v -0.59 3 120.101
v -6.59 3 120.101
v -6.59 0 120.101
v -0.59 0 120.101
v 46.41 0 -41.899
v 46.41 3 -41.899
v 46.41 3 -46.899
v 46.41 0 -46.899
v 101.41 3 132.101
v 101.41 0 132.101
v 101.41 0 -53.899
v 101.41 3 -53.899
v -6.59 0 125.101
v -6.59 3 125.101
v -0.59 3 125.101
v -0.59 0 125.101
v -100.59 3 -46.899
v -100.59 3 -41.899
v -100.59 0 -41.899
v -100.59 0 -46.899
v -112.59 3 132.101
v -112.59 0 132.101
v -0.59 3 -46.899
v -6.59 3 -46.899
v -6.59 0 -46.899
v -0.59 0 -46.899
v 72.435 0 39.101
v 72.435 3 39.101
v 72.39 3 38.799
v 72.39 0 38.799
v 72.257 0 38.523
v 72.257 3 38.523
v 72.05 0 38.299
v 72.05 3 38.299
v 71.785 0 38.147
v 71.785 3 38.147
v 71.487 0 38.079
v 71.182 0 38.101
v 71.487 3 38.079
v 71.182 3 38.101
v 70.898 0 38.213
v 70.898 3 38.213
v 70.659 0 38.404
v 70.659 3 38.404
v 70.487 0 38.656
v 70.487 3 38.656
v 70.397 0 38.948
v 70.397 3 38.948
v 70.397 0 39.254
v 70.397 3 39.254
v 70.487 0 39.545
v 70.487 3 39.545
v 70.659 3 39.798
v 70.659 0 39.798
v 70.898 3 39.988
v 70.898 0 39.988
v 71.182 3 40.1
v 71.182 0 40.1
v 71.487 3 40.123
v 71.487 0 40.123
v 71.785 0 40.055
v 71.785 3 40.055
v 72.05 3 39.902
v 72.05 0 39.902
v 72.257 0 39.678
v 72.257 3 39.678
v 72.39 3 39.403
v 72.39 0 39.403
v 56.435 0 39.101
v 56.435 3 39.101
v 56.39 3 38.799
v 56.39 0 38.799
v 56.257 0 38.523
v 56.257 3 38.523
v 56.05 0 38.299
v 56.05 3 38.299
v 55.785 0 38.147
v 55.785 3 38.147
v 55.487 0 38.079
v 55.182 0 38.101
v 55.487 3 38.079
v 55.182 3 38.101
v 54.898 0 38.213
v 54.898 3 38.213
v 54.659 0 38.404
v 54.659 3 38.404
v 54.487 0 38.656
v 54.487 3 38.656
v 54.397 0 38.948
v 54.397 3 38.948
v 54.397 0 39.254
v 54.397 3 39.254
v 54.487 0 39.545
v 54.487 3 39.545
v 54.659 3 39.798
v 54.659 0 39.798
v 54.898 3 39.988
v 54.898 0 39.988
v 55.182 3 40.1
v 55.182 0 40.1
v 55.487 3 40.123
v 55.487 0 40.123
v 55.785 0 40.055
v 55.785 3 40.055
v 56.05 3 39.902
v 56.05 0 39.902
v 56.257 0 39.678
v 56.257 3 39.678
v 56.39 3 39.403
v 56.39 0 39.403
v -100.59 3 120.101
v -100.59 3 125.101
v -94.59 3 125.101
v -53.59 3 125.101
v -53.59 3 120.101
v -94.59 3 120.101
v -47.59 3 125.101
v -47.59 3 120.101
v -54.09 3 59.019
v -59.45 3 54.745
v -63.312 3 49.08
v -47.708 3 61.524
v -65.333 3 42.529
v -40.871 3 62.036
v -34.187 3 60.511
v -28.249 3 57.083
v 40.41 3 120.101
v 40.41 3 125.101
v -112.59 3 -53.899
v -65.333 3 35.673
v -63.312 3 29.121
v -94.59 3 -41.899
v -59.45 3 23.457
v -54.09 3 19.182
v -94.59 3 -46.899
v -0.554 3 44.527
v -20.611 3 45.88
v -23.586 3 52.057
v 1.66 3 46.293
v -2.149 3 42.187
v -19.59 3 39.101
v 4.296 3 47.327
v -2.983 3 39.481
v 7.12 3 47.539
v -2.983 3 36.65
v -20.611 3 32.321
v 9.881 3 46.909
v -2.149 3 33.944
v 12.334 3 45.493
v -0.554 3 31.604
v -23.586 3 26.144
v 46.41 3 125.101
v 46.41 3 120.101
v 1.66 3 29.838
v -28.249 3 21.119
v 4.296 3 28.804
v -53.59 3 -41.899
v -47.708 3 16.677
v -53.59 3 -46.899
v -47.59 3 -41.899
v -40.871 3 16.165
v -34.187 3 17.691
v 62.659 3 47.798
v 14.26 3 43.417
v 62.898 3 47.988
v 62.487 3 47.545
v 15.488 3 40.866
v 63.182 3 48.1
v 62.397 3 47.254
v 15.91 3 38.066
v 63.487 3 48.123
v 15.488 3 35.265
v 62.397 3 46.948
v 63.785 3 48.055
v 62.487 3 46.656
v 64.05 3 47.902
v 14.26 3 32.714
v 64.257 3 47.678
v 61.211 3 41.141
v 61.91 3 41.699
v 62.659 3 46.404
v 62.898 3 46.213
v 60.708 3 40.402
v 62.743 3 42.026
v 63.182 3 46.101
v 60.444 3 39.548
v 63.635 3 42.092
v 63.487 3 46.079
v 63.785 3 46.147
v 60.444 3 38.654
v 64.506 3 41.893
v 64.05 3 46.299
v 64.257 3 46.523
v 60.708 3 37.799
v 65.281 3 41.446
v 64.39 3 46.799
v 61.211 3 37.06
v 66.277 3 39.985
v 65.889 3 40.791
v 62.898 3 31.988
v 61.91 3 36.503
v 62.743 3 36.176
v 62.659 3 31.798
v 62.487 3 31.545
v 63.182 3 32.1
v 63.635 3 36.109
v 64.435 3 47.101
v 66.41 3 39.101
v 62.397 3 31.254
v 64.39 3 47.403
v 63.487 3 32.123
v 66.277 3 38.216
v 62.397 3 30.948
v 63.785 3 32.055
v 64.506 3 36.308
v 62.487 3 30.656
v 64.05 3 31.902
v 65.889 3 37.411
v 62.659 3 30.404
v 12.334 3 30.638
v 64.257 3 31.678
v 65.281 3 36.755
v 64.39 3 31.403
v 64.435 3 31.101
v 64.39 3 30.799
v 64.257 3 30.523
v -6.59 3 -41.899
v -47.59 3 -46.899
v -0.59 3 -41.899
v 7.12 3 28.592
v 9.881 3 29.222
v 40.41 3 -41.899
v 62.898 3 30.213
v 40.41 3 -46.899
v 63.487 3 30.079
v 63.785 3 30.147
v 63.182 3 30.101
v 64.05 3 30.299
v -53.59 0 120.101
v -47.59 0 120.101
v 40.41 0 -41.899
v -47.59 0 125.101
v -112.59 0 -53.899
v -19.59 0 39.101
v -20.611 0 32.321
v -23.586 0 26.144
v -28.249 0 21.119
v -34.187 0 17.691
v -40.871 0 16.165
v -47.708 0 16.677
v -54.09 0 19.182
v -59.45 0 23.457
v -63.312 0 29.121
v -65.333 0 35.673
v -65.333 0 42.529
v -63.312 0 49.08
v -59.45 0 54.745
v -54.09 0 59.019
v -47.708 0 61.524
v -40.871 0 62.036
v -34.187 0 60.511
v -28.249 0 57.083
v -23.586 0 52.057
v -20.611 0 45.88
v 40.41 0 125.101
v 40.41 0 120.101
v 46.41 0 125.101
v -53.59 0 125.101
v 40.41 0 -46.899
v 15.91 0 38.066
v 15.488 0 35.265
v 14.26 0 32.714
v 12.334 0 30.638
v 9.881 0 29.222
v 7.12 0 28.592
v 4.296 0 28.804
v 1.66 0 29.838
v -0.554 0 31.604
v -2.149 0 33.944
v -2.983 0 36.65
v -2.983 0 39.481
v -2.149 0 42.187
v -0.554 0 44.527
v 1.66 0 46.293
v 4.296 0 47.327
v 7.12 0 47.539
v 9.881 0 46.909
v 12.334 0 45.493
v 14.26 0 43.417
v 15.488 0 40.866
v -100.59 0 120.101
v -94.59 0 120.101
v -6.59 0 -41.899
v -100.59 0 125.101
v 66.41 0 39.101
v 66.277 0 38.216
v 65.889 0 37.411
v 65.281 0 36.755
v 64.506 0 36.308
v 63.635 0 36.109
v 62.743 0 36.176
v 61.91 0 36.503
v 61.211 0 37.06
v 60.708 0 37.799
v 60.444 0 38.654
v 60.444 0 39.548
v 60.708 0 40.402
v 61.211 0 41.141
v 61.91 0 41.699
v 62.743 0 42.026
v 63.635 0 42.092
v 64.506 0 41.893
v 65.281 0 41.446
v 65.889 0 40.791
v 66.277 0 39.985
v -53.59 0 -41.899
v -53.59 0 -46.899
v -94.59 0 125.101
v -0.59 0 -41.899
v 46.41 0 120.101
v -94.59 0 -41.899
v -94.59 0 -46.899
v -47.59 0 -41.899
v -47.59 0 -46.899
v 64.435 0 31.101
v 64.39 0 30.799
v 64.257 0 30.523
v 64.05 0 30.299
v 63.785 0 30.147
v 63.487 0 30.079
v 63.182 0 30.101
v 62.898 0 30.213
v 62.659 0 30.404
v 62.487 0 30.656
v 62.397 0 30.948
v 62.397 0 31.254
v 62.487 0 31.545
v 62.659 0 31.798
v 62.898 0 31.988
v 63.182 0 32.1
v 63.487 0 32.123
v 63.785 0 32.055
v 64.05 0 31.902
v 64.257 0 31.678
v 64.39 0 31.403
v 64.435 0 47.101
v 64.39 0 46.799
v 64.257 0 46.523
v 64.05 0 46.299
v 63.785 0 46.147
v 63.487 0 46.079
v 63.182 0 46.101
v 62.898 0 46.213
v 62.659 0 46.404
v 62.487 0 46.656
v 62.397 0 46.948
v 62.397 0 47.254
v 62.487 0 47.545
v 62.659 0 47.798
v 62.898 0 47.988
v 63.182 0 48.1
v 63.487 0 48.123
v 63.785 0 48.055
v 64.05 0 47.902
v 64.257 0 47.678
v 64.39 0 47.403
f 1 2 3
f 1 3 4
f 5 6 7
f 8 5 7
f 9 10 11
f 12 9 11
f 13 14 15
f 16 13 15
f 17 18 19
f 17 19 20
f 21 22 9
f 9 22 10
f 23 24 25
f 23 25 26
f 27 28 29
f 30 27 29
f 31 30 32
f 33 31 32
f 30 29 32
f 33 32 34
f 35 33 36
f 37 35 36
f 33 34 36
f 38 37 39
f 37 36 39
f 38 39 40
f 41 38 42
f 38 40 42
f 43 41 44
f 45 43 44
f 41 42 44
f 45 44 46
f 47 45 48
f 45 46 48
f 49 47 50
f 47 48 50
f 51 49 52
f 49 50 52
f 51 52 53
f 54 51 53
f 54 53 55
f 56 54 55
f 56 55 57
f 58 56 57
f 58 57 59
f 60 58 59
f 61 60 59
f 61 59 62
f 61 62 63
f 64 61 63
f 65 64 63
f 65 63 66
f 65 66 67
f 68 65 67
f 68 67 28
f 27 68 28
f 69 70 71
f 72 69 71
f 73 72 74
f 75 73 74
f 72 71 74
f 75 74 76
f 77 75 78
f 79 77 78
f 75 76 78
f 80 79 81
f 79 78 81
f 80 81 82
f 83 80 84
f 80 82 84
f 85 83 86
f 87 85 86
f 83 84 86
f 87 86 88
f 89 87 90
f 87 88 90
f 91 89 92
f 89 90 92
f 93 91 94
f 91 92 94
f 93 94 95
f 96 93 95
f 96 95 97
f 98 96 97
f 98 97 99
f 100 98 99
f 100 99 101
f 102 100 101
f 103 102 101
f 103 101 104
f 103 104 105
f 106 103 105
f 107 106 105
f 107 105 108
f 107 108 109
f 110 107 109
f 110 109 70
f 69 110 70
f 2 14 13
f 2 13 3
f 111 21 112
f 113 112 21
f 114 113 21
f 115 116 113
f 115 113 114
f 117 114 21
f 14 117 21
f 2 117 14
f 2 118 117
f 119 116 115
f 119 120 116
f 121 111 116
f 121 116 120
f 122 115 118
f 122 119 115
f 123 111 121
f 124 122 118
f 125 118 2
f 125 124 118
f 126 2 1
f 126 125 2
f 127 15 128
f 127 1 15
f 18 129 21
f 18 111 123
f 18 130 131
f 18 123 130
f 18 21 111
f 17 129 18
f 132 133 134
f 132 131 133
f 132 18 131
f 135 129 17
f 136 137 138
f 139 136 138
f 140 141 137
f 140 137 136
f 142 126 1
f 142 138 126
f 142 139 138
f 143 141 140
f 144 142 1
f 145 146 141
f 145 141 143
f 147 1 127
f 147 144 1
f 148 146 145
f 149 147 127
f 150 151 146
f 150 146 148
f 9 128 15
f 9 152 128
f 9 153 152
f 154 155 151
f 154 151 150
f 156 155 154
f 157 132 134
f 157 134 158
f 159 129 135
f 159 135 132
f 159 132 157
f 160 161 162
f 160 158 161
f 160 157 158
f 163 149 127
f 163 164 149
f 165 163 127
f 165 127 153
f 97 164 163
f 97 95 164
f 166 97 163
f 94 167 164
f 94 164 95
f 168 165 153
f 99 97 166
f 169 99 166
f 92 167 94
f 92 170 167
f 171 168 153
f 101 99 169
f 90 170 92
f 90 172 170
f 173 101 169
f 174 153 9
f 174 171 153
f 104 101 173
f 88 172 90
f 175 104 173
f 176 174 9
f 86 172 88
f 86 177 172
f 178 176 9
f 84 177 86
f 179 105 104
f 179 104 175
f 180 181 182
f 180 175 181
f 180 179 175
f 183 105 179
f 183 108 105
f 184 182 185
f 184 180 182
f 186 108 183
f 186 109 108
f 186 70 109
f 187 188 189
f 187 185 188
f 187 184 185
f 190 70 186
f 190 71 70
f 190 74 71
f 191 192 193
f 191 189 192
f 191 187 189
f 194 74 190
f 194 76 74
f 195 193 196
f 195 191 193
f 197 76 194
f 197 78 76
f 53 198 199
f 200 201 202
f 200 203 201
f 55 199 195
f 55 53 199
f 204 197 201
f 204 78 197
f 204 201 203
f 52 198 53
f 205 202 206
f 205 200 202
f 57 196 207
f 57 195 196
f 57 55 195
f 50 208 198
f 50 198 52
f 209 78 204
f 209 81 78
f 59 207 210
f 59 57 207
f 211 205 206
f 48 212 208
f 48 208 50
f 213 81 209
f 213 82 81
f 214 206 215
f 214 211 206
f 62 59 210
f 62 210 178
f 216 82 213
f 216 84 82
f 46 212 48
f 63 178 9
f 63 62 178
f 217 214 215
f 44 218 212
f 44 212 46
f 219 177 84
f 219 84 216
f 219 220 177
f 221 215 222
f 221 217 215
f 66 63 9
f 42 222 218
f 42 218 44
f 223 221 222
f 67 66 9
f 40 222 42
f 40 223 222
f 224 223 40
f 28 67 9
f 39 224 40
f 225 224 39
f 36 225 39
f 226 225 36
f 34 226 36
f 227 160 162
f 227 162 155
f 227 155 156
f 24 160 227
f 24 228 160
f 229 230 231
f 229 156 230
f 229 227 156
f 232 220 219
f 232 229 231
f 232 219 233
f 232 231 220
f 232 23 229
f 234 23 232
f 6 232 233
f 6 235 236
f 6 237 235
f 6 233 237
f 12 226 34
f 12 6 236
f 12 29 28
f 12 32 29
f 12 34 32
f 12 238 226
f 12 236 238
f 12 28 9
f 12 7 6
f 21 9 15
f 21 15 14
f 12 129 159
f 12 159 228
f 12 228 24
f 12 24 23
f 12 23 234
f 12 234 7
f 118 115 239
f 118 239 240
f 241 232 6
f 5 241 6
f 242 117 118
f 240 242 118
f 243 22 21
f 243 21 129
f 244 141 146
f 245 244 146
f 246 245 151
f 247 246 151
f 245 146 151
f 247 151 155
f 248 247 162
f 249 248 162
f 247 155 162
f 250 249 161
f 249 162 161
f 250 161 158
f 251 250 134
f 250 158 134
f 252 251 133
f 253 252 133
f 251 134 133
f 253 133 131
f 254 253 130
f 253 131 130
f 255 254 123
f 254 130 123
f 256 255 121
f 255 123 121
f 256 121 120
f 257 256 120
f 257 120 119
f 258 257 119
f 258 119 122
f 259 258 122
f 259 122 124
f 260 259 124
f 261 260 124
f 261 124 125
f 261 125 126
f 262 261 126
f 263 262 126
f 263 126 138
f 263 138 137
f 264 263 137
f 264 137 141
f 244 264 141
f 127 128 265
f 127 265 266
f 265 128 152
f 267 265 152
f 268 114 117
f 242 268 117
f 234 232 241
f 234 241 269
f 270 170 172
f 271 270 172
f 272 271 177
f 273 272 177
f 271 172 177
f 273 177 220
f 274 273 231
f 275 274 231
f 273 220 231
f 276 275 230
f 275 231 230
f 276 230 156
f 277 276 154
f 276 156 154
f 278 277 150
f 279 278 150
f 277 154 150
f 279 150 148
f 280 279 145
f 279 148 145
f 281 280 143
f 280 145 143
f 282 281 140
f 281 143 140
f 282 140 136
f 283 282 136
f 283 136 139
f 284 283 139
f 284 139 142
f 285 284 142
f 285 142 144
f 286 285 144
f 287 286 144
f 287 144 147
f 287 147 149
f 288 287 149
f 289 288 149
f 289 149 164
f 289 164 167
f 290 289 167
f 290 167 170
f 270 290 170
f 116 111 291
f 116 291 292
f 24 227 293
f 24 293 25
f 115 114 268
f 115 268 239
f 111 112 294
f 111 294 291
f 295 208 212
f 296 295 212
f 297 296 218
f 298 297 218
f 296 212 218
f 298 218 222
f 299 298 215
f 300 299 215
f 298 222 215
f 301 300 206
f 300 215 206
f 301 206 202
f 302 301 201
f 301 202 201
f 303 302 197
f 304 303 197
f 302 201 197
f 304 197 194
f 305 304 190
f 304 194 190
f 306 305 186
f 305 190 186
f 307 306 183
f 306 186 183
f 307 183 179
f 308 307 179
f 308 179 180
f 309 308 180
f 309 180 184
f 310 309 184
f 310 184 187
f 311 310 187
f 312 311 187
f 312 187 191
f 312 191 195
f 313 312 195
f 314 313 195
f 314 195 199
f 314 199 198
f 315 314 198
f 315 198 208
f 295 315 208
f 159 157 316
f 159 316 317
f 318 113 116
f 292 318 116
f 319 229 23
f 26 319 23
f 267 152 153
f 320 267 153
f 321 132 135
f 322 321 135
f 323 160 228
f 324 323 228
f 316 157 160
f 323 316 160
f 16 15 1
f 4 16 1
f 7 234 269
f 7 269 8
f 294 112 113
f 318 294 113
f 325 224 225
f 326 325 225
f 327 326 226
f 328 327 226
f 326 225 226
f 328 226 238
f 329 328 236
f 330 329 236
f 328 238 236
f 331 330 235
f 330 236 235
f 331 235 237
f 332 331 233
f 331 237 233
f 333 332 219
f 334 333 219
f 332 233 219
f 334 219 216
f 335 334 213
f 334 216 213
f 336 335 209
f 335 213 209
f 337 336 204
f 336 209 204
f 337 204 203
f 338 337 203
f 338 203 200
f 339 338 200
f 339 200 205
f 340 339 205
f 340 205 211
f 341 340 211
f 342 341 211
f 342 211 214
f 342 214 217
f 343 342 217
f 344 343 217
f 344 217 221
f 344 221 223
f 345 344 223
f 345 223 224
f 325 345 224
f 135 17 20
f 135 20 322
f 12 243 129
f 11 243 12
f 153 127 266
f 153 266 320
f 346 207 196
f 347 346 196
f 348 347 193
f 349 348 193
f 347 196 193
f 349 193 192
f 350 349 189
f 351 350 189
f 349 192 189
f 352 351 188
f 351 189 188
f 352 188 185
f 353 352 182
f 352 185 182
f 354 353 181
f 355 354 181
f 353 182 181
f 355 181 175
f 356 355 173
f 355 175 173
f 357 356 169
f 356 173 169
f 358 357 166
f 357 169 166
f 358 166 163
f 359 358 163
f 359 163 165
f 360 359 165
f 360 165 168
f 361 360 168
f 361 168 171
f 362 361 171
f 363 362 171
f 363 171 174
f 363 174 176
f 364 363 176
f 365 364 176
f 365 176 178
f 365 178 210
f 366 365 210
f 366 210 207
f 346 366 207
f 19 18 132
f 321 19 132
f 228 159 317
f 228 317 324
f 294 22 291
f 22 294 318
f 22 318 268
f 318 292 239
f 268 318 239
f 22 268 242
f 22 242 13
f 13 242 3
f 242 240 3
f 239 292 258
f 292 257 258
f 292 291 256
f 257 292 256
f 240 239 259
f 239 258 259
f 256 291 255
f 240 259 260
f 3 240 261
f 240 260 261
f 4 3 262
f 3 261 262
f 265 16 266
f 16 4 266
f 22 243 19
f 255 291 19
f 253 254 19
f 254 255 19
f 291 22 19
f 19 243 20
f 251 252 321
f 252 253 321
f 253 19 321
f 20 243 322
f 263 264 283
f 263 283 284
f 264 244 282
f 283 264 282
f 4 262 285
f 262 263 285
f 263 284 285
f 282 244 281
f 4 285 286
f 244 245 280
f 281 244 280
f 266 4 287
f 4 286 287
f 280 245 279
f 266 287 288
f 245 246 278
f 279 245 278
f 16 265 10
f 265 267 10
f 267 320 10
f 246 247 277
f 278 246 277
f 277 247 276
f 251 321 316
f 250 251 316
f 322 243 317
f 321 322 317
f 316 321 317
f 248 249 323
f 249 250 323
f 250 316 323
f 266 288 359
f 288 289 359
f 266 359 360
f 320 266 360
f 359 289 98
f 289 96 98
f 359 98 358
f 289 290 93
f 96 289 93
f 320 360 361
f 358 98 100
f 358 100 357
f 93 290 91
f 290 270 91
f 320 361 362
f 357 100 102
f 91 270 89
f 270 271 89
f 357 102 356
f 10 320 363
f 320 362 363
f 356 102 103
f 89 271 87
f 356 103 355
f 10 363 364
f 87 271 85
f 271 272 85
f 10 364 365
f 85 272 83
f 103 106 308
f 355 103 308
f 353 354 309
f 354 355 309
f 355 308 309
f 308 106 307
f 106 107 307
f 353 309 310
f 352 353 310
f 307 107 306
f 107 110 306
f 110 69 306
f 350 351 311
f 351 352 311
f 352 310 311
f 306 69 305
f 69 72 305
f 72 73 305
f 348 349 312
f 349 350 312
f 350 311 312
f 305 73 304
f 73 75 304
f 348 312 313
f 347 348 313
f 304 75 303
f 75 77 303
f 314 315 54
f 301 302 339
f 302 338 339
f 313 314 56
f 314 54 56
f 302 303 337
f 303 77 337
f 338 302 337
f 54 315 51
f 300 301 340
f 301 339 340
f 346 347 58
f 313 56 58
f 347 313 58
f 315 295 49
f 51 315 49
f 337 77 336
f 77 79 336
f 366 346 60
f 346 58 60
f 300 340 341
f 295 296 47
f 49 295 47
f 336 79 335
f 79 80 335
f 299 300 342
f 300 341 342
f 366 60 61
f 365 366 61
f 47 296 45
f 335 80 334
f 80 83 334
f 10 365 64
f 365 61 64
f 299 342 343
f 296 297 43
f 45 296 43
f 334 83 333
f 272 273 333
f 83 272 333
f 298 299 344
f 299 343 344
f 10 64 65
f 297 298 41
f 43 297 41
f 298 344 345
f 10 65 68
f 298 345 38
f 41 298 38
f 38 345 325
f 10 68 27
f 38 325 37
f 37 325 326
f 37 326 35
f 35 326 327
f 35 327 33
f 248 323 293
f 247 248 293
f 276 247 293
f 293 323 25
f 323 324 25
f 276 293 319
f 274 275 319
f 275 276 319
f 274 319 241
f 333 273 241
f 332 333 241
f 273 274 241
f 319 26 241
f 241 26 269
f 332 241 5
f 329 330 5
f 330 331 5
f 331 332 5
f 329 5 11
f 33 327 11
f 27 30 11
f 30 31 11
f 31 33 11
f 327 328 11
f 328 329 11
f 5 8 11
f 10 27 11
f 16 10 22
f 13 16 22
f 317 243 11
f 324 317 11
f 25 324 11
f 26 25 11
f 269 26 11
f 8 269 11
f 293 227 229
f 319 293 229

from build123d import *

# Parameters (mm, degrees)
SKETCH1_W           = 214
SKETCH1_H           = 186
BOSS_EXTRUDE1_DEPTH = 3
SKETCH2_R           = 23
SPEAKER_DEPTH       = 4
SKETCH4_R           = 3
SKETCH4_R_2         = 1.025
MOTOR_DEPTH         = 4
SKETCH6_W           = 6
SKETCH6_H           = 5
IZGARALAR_DEPTH     = 4
SKETCH7_R           = 9.5
MOTOR_KABLOSU_DEPTH = 4


with BuildPart() as part:
    # Sketch1 → Boss-Extrude1 (new body)
    with BuildSketch(Plane(origin=(0, 0, 0), x_dir=(1, 0, 0), z_dir=(0, 1, 0))):
        with Locations((-5.589552239, -39.100746269)):
            Rectangle(SKETCH1_W, SKETCH1_H)
    extrude(amount=BOSS_EXTRUDE1_DEPTH)

    # Sketch2 → Speaker (cut, through all)
    with BuildSketch(Plane(origin=(0, 3, 0), x_dir=(1, 0, 0), z_dir=(0, 1, 0))):
        with Locations((-42.589552239, -39.100746269)):
            Circle(SKETCH2_R)
    extrude(amount=-SPEAKER_DEPTH, mode=Mode.SUBTRACT)

    # Sketch4 → Motor (cut, through all)
    with BuildSketch(Plane(origin=(0, 3, 0), x_dir=(1, 0, 0), z_dir=(0, 1, 0))):
        with Locations((63.410447761, -39.100746269)):
            Circle(SKETCH4_R)
        with Locations((63.410447761, -31.100746269)):
            Circle(SKETCH4_R_2)
        with Locations((71.410447761, -39.100746269)):
            Circle(SKETCH4_R_2)
        with Locations((63.410447761, -47.100746269)):
            Circle(SKETCH4_R_2)
        with Locations((55.410447761, -39.100746269)):
            Circle(SKETCH4_R_2)
    extrude(amount=-MOTOR_DEPTH, mode=Mode.SUBTRACT)

    # Sketch6 → Izgaralar (cut, through all)
    with BuildSketch(Plane(origin=(0, 3, 0), x_dir=(1, 0, 0), z_dir=(0, 1, 0))):
        with Locations((-97.589552239, -122.600746269)):
            Rectangle(SKETCH6_W, SKETCH6_H)
        with Locations((-50.589552239, -122.600746269)):
            Rectangle(SKETCH6_W, SKETCH6_H)
        with Locations((-3.589552239, -122.600746269)):
            Rectangle(SKETCH6_W, SKETCH6_H)
        with Locations((-97.589552239, 44.399253731)):
            Rectangle(SKETCH6_W, SKETCH6_H)
        with Locations((-50.589552239, 44.399253731)):
            Rectangle(SKETCH6_W, SKETCH6_H)
        with Locations((-3.589552239, 44.399253731)):
            Rectangle(SKETCH6_W, SKETCH6_H)
        with Locations((43.410447761, -122.600746269)):
            Rectangle(SKETCH6_W, SKETCH6_H)
        with Locations((43.410447761, 44.399253731)):
            Rectangle(SKETCH6_W, SKETCH6_H)
    extrude(amount=-IZGARALAR_DEPTH, mode=Mode.SUBTRACT)

    # Sketch7 → Motor Kablosu (cut, through all)
    with BuildSketch(Plane(origin=(0, 3, 0), x_dir=(1, 0, 0), z_dir=(0, 1, 0))):
        with Locations((6.410447761, -38.065571016)):
            Circle(SKETCH7_R)
    extrude(amount=-MOTOR_KABLOSU_DEPTH, mode=Mode.SUBTRACT)


solid = part.part
